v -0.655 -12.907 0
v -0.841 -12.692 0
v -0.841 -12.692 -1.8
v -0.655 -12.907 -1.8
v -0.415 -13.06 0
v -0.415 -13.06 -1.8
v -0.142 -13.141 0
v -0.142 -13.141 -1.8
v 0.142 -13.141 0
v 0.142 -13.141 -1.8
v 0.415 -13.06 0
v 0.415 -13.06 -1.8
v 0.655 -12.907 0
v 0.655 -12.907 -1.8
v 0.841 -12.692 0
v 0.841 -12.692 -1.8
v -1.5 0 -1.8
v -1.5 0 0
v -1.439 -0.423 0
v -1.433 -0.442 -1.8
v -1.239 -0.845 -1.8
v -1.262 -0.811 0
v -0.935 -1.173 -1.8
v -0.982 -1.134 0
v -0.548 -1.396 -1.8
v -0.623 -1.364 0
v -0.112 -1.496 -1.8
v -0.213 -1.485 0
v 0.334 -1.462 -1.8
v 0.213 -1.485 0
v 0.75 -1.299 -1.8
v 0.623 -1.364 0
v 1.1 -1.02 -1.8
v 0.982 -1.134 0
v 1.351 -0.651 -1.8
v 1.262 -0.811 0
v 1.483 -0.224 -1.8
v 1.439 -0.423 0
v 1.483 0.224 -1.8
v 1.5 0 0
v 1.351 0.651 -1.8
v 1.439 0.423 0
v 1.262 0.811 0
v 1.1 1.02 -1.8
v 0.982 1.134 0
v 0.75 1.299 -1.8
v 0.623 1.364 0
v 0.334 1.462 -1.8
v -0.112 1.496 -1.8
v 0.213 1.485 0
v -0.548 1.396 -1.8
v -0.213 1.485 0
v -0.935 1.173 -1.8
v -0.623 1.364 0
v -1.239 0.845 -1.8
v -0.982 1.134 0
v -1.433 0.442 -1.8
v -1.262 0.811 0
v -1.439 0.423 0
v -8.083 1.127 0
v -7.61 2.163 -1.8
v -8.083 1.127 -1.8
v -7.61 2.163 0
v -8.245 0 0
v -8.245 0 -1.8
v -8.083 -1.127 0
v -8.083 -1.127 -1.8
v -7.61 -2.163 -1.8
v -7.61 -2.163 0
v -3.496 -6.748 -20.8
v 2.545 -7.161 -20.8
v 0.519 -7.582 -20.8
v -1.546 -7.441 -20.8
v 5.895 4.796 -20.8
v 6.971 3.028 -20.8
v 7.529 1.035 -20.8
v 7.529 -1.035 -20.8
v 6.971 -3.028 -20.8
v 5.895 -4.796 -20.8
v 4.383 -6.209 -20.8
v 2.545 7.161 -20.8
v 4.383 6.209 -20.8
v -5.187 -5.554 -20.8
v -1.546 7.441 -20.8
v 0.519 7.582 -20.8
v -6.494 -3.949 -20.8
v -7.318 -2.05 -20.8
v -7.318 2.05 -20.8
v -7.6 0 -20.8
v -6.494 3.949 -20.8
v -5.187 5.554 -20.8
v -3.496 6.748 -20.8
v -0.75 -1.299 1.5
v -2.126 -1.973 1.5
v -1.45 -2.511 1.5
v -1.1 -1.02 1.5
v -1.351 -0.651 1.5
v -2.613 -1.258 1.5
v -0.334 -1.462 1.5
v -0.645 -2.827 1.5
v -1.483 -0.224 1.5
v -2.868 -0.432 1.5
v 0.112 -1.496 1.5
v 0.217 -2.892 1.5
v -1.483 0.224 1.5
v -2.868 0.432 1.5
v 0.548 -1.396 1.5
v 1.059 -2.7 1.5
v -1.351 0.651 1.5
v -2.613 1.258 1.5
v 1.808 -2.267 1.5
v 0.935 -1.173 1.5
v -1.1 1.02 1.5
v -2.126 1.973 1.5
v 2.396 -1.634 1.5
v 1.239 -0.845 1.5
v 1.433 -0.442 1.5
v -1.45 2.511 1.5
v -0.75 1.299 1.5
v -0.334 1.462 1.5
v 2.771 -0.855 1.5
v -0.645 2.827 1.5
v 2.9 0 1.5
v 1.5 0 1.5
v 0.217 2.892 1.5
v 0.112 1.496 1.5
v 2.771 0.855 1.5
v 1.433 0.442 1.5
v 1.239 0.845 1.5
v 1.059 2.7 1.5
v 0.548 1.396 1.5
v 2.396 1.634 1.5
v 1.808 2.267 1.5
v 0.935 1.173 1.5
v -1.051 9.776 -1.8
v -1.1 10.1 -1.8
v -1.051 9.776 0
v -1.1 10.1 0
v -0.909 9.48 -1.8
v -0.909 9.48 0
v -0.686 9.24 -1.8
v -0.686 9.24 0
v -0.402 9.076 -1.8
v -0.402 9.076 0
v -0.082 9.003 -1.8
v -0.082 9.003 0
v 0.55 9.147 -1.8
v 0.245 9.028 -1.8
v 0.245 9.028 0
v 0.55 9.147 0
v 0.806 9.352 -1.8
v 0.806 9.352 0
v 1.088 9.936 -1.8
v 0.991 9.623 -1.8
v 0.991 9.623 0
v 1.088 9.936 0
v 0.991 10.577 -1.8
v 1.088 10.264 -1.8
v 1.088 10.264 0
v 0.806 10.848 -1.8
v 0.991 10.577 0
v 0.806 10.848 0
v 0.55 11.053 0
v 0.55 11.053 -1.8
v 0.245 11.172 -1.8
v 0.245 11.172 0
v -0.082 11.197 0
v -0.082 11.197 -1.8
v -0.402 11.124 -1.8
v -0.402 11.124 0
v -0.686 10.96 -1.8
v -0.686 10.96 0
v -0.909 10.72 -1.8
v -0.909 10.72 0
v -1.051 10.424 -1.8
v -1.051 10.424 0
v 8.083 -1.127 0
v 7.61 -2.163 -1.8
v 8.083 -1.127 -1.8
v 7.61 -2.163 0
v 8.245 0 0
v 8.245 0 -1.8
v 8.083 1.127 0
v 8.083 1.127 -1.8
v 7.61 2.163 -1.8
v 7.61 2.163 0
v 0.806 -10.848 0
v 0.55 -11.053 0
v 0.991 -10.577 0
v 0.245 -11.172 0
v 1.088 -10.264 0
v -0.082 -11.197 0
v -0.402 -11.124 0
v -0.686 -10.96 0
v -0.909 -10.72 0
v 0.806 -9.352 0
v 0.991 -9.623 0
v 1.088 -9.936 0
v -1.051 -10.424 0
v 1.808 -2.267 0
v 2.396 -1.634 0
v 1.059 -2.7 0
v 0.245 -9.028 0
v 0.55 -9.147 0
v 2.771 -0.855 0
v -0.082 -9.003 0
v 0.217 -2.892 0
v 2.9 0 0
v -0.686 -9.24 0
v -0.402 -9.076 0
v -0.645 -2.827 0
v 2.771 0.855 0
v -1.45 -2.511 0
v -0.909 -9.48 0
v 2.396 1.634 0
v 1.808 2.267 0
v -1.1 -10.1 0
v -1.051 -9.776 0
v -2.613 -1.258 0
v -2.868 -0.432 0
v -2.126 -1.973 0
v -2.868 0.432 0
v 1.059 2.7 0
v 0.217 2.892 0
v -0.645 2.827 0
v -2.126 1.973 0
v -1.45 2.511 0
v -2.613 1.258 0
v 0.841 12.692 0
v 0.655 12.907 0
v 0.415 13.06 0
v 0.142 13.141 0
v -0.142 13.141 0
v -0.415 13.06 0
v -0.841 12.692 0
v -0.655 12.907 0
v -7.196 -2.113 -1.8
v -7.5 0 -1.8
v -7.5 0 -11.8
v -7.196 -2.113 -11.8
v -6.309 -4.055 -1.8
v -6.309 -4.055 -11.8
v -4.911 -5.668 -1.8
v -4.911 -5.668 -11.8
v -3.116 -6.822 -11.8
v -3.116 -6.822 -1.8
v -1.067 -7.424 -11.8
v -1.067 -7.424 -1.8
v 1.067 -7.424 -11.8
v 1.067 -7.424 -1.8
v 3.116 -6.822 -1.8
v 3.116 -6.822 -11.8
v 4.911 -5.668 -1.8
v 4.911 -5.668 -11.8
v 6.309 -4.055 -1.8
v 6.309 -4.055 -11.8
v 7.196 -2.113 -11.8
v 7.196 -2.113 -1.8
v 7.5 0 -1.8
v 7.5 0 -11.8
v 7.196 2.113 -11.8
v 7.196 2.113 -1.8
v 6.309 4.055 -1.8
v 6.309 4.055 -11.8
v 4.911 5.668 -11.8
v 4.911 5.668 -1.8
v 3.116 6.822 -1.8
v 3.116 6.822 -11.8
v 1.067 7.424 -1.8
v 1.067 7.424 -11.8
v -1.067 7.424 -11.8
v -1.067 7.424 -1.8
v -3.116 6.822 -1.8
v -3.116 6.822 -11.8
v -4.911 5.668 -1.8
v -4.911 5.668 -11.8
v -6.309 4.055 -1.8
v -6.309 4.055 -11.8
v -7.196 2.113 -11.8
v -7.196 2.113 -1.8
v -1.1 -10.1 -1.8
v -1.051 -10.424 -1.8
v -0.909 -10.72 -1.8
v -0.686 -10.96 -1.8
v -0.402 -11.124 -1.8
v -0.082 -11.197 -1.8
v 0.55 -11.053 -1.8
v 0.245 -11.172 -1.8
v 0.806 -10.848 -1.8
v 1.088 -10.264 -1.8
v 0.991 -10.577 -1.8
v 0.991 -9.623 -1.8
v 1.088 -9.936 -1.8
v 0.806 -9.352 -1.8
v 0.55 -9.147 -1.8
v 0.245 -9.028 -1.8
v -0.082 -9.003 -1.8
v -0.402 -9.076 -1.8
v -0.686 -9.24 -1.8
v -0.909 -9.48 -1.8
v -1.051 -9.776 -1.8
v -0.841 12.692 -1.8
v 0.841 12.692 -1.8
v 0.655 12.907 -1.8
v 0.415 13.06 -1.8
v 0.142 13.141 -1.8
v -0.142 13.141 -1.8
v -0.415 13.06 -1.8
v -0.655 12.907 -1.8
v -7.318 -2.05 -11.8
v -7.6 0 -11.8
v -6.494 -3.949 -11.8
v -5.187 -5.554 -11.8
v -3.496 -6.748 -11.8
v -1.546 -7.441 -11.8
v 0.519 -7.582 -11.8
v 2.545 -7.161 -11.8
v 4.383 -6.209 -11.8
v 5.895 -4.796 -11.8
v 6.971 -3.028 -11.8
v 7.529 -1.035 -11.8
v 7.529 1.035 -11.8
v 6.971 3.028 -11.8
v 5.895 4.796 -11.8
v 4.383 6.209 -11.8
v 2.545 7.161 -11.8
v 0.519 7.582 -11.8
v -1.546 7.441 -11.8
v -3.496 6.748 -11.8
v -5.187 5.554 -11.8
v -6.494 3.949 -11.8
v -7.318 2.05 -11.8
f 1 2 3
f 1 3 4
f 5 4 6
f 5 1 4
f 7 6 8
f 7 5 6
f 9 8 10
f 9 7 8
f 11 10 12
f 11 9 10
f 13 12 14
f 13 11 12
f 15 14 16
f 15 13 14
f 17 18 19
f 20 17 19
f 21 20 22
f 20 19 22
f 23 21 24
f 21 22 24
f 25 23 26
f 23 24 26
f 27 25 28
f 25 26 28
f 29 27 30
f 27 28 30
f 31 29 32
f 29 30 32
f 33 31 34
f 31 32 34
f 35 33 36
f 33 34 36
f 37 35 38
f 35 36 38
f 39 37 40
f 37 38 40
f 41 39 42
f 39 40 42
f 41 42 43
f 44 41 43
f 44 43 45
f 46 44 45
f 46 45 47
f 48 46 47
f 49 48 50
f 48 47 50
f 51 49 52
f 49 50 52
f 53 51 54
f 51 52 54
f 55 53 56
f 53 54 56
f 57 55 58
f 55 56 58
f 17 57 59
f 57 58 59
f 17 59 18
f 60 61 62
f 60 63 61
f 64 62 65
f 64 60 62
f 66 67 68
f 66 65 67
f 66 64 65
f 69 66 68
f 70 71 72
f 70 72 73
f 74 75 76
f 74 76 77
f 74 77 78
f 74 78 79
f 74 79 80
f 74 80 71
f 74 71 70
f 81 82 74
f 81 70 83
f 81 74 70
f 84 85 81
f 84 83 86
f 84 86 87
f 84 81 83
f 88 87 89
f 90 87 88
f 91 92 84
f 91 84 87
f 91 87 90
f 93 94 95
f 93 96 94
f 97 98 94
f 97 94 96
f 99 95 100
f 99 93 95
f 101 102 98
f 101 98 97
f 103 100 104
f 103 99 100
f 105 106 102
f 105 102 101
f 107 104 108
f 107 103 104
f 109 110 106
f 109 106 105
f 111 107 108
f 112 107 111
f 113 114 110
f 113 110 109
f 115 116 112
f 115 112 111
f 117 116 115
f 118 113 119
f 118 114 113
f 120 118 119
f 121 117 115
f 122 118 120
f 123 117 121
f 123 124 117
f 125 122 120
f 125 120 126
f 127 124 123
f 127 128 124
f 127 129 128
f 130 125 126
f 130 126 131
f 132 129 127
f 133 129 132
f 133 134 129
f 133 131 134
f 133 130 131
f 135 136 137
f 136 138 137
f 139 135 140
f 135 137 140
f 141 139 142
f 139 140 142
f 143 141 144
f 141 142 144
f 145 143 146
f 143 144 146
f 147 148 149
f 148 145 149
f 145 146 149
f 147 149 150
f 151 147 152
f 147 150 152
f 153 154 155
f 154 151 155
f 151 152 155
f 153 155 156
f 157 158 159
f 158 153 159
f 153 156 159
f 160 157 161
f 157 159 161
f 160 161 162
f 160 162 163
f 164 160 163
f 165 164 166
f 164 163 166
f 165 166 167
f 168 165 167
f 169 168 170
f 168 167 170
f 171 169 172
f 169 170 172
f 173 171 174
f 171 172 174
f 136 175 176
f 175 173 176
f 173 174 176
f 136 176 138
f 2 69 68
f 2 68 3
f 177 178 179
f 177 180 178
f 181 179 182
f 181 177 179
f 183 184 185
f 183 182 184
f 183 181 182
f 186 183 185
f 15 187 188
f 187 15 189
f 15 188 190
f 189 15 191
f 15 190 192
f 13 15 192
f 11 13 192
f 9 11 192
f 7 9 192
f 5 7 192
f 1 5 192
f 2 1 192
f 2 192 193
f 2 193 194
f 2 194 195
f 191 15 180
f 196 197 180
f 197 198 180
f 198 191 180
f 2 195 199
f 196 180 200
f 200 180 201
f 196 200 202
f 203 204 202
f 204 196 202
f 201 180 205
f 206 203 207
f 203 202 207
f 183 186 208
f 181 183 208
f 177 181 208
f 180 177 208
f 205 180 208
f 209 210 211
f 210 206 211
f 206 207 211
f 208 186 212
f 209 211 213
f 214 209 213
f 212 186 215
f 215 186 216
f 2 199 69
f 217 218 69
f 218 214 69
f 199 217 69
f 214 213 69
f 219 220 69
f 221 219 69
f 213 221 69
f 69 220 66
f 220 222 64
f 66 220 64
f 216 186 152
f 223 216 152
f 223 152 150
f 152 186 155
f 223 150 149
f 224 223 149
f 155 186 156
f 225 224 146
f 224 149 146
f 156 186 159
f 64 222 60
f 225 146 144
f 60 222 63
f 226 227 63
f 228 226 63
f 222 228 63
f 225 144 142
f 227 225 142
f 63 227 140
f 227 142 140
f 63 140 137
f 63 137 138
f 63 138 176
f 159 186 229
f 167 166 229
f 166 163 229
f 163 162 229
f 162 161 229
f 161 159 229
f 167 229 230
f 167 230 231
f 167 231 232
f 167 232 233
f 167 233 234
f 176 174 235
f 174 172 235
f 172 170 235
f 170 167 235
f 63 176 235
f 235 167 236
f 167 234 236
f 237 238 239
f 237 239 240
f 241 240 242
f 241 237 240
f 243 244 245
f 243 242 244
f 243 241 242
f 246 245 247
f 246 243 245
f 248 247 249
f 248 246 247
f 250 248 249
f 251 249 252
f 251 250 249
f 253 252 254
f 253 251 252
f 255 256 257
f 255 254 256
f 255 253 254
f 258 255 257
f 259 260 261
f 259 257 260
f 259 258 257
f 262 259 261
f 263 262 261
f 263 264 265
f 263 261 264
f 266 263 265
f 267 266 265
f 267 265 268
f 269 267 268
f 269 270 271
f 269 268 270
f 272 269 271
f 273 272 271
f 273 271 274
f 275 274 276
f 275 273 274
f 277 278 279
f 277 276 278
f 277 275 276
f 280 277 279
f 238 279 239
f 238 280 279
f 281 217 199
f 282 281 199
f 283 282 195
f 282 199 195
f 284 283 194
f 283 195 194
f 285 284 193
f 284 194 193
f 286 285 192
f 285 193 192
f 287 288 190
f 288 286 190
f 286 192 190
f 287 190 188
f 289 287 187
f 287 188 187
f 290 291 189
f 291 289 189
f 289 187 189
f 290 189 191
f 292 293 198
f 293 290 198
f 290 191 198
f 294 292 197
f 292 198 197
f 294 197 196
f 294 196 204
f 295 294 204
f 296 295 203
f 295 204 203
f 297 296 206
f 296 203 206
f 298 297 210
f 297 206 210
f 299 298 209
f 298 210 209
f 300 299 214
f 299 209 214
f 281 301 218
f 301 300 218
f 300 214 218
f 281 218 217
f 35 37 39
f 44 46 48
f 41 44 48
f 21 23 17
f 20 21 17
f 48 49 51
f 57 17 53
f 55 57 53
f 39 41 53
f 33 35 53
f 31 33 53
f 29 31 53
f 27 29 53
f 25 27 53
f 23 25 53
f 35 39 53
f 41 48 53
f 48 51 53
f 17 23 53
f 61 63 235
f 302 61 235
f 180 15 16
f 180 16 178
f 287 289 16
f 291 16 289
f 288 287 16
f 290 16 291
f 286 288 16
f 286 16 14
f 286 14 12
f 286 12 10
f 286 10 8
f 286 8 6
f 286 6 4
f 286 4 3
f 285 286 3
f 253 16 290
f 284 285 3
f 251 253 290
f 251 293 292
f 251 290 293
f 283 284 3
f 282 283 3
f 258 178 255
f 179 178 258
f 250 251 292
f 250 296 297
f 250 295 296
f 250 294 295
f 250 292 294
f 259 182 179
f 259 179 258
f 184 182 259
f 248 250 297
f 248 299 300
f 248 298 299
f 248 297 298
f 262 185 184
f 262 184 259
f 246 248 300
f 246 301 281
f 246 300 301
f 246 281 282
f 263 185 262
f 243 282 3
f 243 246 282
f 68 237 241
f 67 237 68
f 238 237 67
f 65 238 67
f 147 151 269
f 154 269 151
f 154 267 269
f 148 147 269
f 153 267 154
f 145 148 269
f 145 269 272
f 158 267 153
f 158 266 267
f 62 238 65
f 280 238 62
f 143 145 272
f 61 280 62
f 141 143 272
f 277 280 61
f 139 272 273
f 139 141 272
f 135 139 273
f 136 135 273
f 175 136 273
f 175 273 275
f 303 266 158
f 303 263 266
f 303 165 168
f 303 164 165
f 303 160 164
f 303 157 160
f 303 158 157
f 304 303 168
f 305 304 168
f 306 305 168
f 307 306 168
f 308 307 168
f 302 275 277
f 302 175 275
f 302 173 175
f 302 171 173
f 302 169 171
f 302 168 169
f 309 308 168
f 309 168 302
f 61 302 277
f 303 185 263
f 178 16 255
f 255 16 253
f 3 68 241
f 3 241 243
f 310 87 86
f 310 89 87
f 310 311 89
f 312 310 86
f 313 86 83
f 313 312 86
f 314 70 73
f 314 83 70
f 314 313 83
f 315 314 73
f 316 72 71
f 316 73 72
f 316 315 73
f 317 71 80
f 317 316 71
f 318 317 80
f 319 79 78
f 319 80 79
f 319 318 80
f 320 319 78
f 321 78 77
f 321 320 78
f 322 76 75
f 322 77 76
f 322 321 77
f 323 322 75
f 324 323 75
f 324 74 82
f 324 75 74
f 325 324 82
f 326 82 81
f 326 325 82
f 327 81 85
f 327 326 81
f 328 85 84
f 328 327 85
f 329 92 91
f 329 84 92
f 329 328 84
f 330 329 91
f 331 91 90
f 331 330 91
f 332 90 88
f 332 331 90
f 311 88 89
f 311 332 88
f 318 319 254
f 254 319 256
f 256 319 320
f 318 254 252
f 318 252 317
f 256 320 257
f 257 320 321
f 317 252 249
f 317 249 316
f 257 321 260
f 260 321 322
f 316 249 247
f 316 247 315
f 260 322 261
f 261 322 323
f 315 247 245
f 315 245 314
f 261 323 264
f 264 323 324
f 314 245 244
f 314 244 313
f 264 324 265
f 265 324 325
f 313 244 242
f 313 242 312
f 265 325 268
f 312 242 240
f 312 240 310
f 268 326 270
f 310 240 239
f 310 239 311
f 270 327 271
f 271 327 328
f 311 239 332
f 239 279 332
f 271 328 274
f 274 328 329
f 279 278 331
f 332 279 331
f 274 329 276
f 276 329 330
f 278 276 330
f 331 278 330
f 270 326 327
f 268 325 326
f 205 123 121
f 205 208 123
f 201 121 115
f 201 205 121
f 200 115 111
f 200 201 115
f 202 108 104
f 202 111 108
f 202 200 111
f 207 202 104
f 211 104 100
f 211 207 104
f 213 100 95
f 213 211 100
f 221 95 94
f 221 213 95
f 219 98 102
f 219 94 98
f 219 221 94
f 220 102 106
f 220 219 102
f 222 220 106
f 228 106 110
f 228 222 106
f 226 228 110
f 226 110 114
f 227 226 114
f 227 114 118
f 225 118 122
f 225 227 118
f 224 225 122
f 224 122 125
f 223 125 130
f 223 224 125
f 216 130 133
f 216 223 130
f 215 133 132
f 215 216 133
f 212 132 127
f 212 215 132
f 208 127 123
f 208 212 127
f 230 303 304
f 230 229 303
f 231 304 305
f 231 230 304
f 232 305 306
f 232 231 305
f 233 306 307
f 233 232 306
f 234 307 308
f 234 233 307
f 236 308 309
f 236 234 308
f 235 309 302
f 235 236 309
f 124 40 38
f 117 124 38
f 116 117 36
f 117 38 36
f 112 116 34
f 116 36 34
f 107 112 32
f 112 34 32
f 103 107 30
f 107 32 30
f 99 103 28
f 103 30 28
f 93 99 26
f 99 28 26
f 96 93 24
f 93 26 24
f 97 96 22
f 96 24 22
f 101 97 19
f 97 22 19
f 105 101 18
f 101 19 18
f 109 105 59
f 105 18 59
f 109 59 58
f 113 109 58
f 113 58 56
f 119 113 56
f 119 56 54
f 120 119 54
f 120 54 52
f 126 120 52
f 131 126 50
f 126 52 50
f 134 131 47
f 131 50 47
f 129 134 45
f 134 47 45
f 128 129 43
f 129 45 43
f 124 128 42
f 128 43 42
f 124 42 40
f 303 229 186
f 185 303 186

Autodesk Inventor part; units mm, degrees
ref_plane "YZ Plane" through (0, 0, 0) normal (1, 0, 0) x (0, 1, 0)
ref_plane "XZ Plane" through (0, 0, 0) normal (0, 1, 0) x (-1, 0, 0)
ref_plane "XY Plane" through (0, 0, 0) normal (0, 0, 1) x (1, 0, 0)
sketch "스케치1" plane through (0, 0, 0) normal (0, 0, 1) x (1, 0, 0)
  circle A0 centre (0, 0) radius 1.5
  circle A1 centre (0, 0) radius 2.9
  dimension "d0" = 3
  dimension "d1" = 5.8
extrude "돌출1" add sketch "스케치1" along normal blind 1.5
sketch "스케치2" plane through (0, 0, 0) normal (0, 0, -1) x (-1, 0, 0)
  line L0 (7.6095, 2.163) -> (0.8412, 12.6915)
  line L1 (-0.8412, 12.6915) -> (-7.6095, 2.163)
  line L2 (7.6095, -2.163) -> (0.8412, -12.6915)
  line L3 (-0.8412, -12.6915) -> (-7.6095, -2.163)
  circle A0 centre (0, 10.1) radius 1.1
  circle A1 centre (0, -10.1) radius 1.1
  arc A2 (0.8412, 12.6915) -> (-0.8412, 12.6915) centre (0, 12.1507) ccw
  arc A3 (-0.8412, -12.6915) -> (0.8412, -12.6915) centre (0, -12.1507) ccw
  arc A4 (7.6095, -2.163) -> (7.6095, 2.163) centre (4.2448, 0) ccw
  arc A5 (-7.6095, 2.163) -> (-7.6095, -2.163) centre (-4.2448, 0) ccw
  circle A6 centre (0, 0) radius 1.5 projected
  dimension "d8" = 2.2
  dimension "d9" = 2.2
  dimension "d10" = 10.1
  dimension "d11" = 10.1
  dimension "d12" = 1
  dimension "d13" = 4
extrude "돌출2" add sketch "스케치2" along normal blind 1.8
sketch "스케치3" plane through (0, 0, -1.8) normal (0, 0, -1) x (-1, 0, 0)
  circle A0 centre (0, 0) radius 1.5 projected
  circle A1 centre (0, -10.1) radius 1.1 projected
  circle A2 centre (0, 10.1) radius 1.1 projected
  line L0 (-0.8412, 12.6915) -> (-7.6095, 2.163) projected
  arc A3 (-7.6095, 2.163) -> (-7.6095, -2.163) centre (-4.2448, 0) ccw projected
  line L1 (-7.6095, -2.163) -> (-0.8412, -12.6915) projected
  arc A4 (-0.8412, -12.6915) -> (0.8412, -12.6915) centre (0, -12.1507) ccw projected
  line L2 (0.8412, -12.6915) -> (7.6095, -2.163) projected
  arc A5 (7.6095, -2.163) -> (7.6095, 2.163) centre (4.2448, 0) ccw projected
  line L3 (7.6095, 2.163) -> (0.8412, 12.6915) projected
  arc A6 (0.8412, 12.6915) -> (-0.8412, 12.6915) centre (0, 12.1507) ccw projected
  circle A7 centre (0, 0) radius 1.5 projected
  circle A8 centre (0, 0) radius 7.5
  dimension "d16" = 15
extrude "돌출3" add sketch "스케치3" along normal blind 10 contours A0 | A8
sketch "스케치4" plane through (0, 0, -11.8) normal (0, 0, -1) x (-1, 0, 0)
  circle A0 centre (0, 0) radius 7.5 projected
  circle A1 centre (0, 0) radius 7.6
  dimension "d19" = 0.1
extrude "돌출4" add sketch "스케치4" along normal blind 9 contours A0 | A1
properties part number "GM15BY_StepMotor"
